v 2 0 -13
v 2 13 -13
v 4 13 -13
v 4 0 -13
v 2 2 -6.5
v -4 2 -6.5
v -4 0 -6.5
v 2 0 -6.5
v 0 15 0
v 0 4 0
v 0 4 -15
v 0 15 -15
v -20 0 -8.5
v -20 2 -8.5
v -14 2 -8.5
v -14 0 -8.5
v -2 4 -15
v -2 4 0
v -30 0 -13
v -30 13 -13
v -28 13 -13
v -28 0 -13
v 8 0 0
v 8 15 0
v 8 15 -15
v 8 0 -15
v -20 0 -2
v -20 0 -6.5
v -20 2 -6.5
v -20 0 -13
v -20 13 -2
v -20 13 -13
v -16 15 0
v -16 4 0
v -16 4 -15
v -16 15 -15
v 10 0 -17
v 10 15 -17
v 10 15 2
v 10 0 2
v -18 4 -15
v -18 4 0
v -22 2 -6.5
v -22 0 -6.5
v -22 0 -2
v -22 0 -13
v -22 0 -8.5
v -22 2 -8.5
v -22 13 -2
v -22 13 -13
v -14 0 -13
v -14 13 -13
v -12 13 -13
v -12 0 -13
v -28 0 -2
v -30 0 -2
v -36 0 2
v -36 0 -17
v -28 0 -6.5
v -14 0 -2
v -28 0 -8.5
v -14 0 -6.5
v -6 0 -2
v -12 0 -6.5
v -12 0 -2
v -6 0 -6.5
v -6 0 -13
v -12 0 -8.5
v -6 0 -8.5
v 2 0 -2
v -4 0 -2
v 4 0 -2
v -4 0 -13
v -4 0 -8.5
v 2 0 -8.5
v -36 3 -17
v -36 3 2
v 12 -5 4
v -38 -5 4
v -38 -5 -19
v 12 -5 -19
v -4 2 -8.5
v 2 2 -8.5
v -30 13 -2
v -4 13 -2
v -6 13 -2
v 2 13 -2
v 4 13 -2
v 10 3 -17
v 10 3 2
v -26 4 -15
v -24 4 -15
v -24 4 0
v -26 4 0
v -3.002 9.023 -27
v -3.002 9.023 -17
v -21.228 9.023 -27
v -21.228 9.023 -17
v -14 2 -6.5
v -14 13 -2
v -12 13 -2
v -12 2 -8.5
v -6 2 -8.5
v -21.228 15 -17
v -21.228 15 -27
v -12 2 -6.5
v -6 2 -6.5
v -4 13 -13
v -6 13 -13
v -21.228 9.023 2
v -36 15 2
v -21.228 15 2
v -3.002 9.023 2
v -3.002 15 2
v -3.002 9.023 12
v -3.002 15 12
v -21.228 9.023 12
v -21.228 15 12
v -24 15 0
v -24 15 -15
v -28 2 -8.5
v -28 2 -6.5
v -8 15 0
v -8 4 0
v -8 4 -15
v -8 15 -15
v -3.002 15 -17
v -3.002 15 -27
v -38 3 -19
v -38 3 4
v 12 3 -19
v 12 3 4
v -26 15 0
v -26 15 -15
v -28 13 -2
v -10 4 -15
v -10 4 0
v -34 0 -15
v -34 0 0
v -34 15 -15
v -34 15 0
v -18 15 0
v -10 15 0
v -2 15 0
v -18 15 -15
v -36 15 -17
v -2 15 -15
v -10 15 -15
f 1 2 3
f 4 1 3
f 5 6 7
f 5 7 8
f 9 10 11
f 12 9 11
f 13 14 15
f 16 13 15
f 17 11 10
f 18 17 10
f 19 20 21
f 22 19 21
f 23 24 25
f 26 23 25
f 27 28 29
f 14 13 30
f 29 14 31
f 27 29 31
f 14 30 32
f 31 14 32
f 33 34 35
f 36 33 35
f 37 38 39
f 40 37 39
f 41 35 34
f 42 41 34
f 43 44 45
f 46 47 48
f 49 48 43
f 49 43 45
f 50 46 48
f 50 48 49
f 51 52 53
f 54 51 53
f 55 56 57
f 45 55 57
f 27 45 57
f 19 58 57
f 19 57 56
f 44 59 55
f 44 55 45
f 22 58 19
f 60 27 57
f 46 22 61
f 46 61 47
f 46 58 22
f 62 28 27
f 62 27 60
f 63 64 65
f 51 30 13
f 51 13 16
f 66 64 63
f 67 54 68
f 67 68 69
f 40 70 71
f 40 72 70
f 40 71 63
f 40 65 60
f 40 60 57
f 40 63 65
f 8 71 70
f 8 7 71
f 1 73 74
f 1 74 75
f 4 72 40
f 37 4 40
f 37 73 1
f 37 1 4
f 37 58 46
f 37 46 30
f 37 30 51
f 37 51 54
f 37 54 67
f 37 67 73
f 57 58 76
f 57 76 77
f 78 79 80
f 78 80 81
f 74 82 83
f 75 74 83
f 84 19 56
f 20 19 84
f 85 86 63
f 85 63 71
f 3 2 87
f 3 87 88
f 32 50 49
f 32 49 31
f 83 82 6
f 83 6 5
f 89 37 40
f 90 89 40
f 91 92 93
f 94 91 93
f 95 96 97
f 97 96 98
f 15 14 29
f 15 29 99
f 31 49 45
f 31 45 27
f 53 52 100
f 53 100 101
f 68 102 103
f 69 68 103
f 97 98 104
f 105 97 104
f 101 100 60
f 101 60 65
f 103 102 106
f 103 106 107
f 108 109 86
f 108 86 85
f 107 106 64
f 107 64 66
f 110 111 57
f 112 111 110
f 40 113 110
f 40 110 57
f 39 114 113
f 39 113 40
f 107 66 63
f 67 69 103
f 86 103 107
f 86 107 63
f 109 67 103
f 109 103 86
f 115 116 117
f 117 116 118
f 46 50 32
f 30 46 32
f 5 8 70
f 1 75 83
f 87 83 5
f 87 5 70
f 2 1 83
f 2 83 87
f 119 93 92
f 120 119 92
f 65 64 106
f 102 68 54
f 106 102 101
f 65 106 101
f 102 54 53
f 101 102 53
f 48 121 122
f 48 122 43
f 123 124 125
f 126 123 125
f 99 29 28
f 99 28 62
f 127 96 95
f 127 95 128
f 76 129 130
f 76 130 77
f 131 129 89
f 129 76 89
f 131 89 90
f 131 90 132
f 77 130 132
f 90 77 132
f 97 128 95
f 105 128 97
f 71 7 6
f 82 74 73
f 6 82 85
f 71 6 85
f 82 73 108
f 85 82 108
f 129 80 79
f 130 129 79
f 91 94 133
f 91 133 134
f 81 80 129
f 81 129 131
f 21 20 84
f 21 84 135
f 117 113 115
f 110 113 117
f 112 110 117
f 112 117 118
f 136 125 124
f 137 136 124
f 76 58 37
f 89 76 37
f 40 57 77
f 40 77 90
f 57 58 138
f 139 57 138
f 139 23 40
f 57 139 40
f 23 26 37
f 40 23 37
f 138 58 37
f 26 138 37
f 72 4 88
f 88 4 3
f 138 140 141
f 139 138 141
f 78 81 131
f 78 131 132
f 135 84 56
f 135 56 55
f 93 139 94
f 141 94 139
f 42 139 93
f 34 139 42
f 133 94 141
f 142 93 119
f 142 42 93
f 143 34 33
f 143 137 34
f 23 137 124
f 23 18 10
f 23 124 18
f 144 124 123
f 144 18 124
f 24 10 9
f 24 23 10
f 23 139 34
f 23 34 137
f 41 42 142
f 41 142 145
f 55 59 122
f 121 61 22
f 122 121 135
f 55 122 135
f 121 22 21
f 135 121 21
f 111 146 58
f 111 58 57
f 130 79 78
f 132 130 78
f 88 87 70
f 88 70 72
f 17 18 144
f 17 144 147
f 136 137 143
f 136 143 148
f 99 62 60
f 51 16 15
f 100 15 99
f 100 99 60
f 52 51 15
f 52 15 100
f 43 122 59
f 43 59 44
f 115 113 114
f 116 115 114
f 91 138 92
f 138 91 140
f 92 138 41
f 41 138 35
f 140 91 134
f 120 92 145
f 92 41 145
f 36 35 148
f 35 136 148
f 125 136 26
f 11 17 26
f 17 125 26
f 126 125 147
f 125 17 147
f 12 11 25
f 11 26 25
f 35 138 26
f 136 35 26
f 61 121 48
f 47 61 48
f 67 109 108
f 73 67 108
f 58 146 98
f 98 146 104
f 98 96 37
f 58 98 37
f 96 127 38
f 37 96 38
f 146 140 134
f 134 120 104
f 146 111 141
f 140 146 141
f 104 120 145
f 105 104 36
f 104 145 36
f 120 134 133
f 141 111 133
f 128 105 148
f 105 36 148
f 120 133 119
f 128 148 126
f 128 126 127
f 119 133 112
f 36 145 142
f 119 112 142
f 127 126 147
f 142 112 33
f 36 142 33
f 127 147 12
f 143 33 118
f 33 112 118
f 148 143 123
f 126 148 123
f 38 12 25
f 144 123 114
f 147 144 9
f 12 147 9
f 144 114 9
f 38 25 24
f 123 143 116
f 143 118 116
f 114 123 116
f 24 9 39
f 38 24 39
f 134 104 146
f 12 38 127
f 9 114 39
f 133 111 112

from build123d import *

# Parameters (mm, degrees)
SKETCH1_W           = 6
SKETCH1_H           = 15
BOSS_EXTRUDE1_DEPTH = 15
SKETCH2_W           = 2
SKETCH2_H           = 11
CUT_EXTRUDE1_DEPTH  = 13
SKETCH3_W           = 15
SKETCH3_H           = 4
BOSS_EXTRUDE2_DEPTH = 2
LPATTERN1_COUNT     = 5
LPATTERN1_PITCH     = 8
SKETCH6_W           = 15
SKETCH6_H           = 15
BOSS_EXTRUDE4_DEPTH = 2
SKETCH8_W           = 15
SKETCH8_H           = 11
BOSS_EXTRUDE5_DEPTH = 2
SKETCH9_W           = 34
SKETCH9_H           = 2
CUT_EXTRUDE2_DEPTH  = 2
BOSS_EXTRUDE6_START = -15
SKETCH10_W          = 46
SKETCH10_H          = 19
BOSS_EXTRUDE6_DEPTH = 20
SPLIT1_START        = -17
SPLIT1_OUTLINE_W    = 46
SPLIT1_OUTLINE_H    = 5
SPLIT1_DEPTH        = 19
SPLIT1_START_2      = -13
SPLIT1_2_OUTLINE_W  = 2
SPLIT1_2_OUTLINE_H  = 13
SPLIT1_2_DEPTH      = 11
SPLIT1_START_3      = -8.5
SPLIT1_3_OUTLINE_W  = 6
SPLIT1_3_OUTLINE_H  = 2
SPLIT1_3_DEPTH      = 2
SPLIT1_START_4      = -5
SPLIT1_4_OUTLINE_W  = 46
SPLIT1_4_OUTLINE_H  = 19
SPLIT1_4_DEPTH      = 5
SPLIT1_5_OUTLINE_W  = 2
SPLIT1_5_OUTLINE_H  = 11
SPLIT1_5_DEPTH      = 13
SPLIT1_6_OUTLINE_W  = 6
SPLIT1_6_OUTLINE_H  = 2
SPLIT1_6_DEPTH      = 2
SKETCH11_W          = 18.225114874
SKETCH11_H          = 5.976921675
BOSS_EXTRUDE7_DEPTH = 10
SKETCH12_W          = 50
SKETCH12_H          = 23
SKETCH12_W_2        = 46
SKETCH12_H_2        = 19
BOSS_EXTRUDE8_DEPTH = 8


# Read off the part's stored shape, not the designer's step: Split1
with BuildPart() as part:
    # Sketch1 → Boss-Extrude1 (new body)
    with BuildSketch(Plane(origin=(0, 0, 0), x_dir=(1, 0, 0), z_dir=(0, 1, 0))):
        with Locations((3, 7.5)):
            Rectangle(SKETCH1_W, SKETCH1_H)
    extrude(amount=BOSS_EXTRUDE1_DEPTH)

    # Sketch2 → Cut-Extrude1 (cut)
    with BuildSketch(Plane.XZ):
        with Locations((3, -7.5)):
            Rectangle(SKETCH2_W, SKETCH2_H)
    extrude(amount=-CUT_EXTRUDE1_DEPTH, mode=Mode.SUBTRACT)

    # Sketch3 → Boss-Extrude2 (add)
    with BuildSketch(Plane.ZY):
        with Locations((-7.5, 2)):
            Rectangle(SKETCH3_W, SKETCH3_H)
    extrude(amount=BOSS_EXTRUDE2_DEPTH)


with BuildPart() as lpattern1_1:
    # LPattern1: pattern copy
    add(part.part.moved(Location(Vector(-1, 0, 0) * (1 * LPATTERN1_PITCH))))


with BuildPart() as lpattern1_2:
    # LPattern1: pattern copy
    add(part.part.moved(Location(Vector(-1, 0, 0) * (2 * LPATTERN1_PITCH))))


with BuildPart() as lpattern1_3:
    # LPattern1: pattern copy
    add(part.part.moved(Location(Vector(-1, 0, 0) * (3 * LPATTERN1_PITCH))))


with BuildPart() as lpattern1_4:
    # LPattern1: pattern copy
    add(part.part.moved(Location(Vector(-1, 0, 0) * (4 * LPATTERN1_PITCH))))


with BuildPart() as lpattern1_1_1:
    add(lpattern1_1.part)

    # Combine1: union LPattern1_2, LPattern1_3, part, LPattern1_4
    add(lpattern1_2.part)
    add(lpattern1_3.part)
    add(part.part)
    add(lpattern1_4.part)

    # Sketch6 → Boss-Extrude4 (add)
    with BuildSketch(Plane(origin=(6, 0, 0), x_dir=(0, 0, -1), z_dir=(1, 0, 0))):
        with Locations((7.5, 7.5)):
            Rectangle(SKETCH6_W, SKETCH6_H)
    extrude(amount=BOSS_EXTRUDE4_DEPTH)

    # Sketch8 → Boss-Extrude5 (add)
    with BuildSketch(Plane.ZY.offset(32)):
        with Locations((-7.5, 9.5)):
            Rectangle(SKETCH8_W, SKETCH8_H)
    extrude(amount=BOSS_EXTRUDE5_DEPTH)

    # Sketch9 → Cut-Extrude2 (cut)
    with BuildSketch(Plane.XZ):
        with Locations((-13, -7.5)):
            Rectangle(SKETCH9_W, SKETCH9_H)
    extrude(amount=-CUT_EXTRUDE2_DEPTH, mode=Mode.SUBTRACT)


with BuildPart() as body_2:
    # Sketch10 → Boss-Extrude6 (new body)
    with BuildSketch(Plane.XZ.offset(BOSS_EXTRUDE6_START)):
        with Locations((-13, -7.5)):
            Rectangle(SKETCH10_W, SKETCH10_H)
    extrude(amount=BOSS_EXTRUDE6_DEPTH)

    # Combine2: cut LPattern1_1
    add(lpattern1_1_1.part, mode=Mode.SUBTRACT)

    # Split1 4 outline → Split1 4 (cut)
    with BuildSketch(Plane(origin=(0, 0, 0), x_dir=(1, 0, 0), z_dir=(0, 1, 0)).offset(SPLIT1_START_4)):
        with Locations((-13, 7.5)):
            Rectangle(SPLIT1_4_OUTLINE_W, SPLIT1_4_OUTLINE_H)
    extrude(amount=SPLIT1_4_DEPTH, mode=Mode.SUBTRACT)

    # Split1 5 outline → Split1 5 (cut)
    with BuildSketch(Plane(origin=(0, 0, 0), x_dir=(1, 0, 0), z_dir=(0, 1, 0))):
        with Locations((-5, 7.5)):
            Rectangle(SPLIT1_5_OUTLINE_W, SPLIT1_5_OUTLINE_H)
        with Locations((3, 7.5)):
            Rectangle(SPLIT1_5_OUTLINE_W, SPLIT1_5_OUTLINE_H)
        with Locations((-13, 7.5)):
            Rectangle(SPLIT1_5_OUTLINE_W, SPLIT1_5_OUTLINE_H)
        with Locations((-21, 7.5)):
            Rectangle(SPLIT1_5_OUTLINE_W, SPLIT1_5_OUTLINE_H)
        with Locations((-29, 7.5)):
            Rectangle(SPLIT1_5_OUTLINE_W, SPLIT1_5_OUTLINE_H)
    extrude(amount=SPLIT1_5_DEPTH, mode=Mode.SUBTRACT)

    # Split1 6 outline → Split1 6 (cut)
    with BuildSketch(Plane(origin=(0, 0, 0), x_dir=(1, 0, 0), z_dir=(0, 1, 0))):
        with Locations((-1, 7.5)):
            Rectangle(SPLIT1_6_OUTLINE_W, SPLIT1_6_OUTLINE_H)
        with Locations((-9, 7.5)):
            Rectangle(SPLIT1_6_OUTLINE_W, SPLIT1_6_OUTLINE_H)
        with Locations((-17, 7.5)):
            Rectangle(SPLIT1_6_OUTLINE_W, SPLIT1_6_OUTLINE_H)
        with Locations((-25, 7.5)):
            Rectangle(SPLIT1_6_OUTLINE_W, SPLIT1_6_OUTLINE_H)
    extrude(amount=SPLIT1_6_DEPTH, mode=Mode.SUBTRACT)

    # Sketch11 → Boss-Extrude7 (add)
    with BuildSketch(Plane(origin=(0, 0, -17), x_dir=(-1, 0, 0), z_dir=(0, 0, -1))):
        with Locations((12.114956568, 12.011539163)):
            Rectangle(SKETCH11_W, SKETCH11_H)
    boss_extrude7 = extrude(amount=BOSS_EXTRUDE7_DEPTH)

    # Mirror1: Boss-Extrude7 across plane
    add(boss_extrude7.mirror(Plane.XY.offset(-7.5)))


with BuildPart() as body_2_2:
    # Split1 outline → Split1 (new body)
    with BuildSketch(Plane.XY.offset(SPLIT1_START)):
        with Locations((-13, -2.5)):
            Rectangle(SPLIT1_OUTLINE_W, SPLIT1_OUTLINE_H)
    extrude(amount=SPLIT1_DEPTH)

    # Split1 2 outline → Split1 2 (add)
    with BuildSketch(Plane.XY.offset(SPLIT1_START_2)):
        with Locations((-29, 6.5)):
            Rectangle(SPLIT1_2_OUTLINE_W, SPLIT1_2_OUTLINE_H)
        with Locations((-21, 6.5)):
            Rectangle(SPLIT1_2_OUTLINE_W, SPLIT1_2_OUTLINE_H)
        with Locations((-13, 6.5)):
            Rectangle(SPLIT1_2_OUTLINE_W, SPLIT1_2_OUTLINE_H)
        with Locations((3, 6.5)):
            Rectangle(SPLIT1_2_OUTLINE_W, SPLIT1_2_OUTLINE_H)
        with Locations((-5, 6.5)):
            Rectangle(SPLIT1_2_OUTLINE_W, SPLIT1_2_OUTLINE_H)
    extrude(amount=SPLIT1_2_DEPTH)

    # Split1 3 outline → Split1 3 (add)
    with BuildSketch(Plane.XY.offset(SPLIT1_START_3)):
        with Locations((-25, 1)):
            Rectangle(SPLIT1_3_OUTLINE_W, SPLIT1_3_OUTLINE_H)
        with Locations((-17, 1)):
            Rectangle(SPLIT1_3_OUTLINE_W, SPLIT1_3_OUTLINE_H)
        with Locations((-9, 1)):
            Rectangle(SPLIT1_3_OUTLINE_W, SPLIT1_3_OUTLINE_H)
        with Locations((-1, 1)):
            Rectangle(SPLIT1_3_OUTLINE_W, SPLIT1_3_OUTLINE_H)
    extrude(amount=SPLIT1_3_DEPTH)

    # Sketch12 → Boss-Extrude8 (add)
    with BuildSketch(Plane.XZ.offset(5)):
        with Locations((-13, -7.5)):
            Rectangle(SKETCH12_W, SKETCH12_H)
        with Locations((-13, -7.5)):
            Rectangle(SKETCH12_W_2, SKETCH12_H_2, mode=Mode.SUBTRACT)
    extrude(amount=-BOSS_EXTRUDE8_DEPTH)


solid = Compound([body_2.part, body_2_2.part])
